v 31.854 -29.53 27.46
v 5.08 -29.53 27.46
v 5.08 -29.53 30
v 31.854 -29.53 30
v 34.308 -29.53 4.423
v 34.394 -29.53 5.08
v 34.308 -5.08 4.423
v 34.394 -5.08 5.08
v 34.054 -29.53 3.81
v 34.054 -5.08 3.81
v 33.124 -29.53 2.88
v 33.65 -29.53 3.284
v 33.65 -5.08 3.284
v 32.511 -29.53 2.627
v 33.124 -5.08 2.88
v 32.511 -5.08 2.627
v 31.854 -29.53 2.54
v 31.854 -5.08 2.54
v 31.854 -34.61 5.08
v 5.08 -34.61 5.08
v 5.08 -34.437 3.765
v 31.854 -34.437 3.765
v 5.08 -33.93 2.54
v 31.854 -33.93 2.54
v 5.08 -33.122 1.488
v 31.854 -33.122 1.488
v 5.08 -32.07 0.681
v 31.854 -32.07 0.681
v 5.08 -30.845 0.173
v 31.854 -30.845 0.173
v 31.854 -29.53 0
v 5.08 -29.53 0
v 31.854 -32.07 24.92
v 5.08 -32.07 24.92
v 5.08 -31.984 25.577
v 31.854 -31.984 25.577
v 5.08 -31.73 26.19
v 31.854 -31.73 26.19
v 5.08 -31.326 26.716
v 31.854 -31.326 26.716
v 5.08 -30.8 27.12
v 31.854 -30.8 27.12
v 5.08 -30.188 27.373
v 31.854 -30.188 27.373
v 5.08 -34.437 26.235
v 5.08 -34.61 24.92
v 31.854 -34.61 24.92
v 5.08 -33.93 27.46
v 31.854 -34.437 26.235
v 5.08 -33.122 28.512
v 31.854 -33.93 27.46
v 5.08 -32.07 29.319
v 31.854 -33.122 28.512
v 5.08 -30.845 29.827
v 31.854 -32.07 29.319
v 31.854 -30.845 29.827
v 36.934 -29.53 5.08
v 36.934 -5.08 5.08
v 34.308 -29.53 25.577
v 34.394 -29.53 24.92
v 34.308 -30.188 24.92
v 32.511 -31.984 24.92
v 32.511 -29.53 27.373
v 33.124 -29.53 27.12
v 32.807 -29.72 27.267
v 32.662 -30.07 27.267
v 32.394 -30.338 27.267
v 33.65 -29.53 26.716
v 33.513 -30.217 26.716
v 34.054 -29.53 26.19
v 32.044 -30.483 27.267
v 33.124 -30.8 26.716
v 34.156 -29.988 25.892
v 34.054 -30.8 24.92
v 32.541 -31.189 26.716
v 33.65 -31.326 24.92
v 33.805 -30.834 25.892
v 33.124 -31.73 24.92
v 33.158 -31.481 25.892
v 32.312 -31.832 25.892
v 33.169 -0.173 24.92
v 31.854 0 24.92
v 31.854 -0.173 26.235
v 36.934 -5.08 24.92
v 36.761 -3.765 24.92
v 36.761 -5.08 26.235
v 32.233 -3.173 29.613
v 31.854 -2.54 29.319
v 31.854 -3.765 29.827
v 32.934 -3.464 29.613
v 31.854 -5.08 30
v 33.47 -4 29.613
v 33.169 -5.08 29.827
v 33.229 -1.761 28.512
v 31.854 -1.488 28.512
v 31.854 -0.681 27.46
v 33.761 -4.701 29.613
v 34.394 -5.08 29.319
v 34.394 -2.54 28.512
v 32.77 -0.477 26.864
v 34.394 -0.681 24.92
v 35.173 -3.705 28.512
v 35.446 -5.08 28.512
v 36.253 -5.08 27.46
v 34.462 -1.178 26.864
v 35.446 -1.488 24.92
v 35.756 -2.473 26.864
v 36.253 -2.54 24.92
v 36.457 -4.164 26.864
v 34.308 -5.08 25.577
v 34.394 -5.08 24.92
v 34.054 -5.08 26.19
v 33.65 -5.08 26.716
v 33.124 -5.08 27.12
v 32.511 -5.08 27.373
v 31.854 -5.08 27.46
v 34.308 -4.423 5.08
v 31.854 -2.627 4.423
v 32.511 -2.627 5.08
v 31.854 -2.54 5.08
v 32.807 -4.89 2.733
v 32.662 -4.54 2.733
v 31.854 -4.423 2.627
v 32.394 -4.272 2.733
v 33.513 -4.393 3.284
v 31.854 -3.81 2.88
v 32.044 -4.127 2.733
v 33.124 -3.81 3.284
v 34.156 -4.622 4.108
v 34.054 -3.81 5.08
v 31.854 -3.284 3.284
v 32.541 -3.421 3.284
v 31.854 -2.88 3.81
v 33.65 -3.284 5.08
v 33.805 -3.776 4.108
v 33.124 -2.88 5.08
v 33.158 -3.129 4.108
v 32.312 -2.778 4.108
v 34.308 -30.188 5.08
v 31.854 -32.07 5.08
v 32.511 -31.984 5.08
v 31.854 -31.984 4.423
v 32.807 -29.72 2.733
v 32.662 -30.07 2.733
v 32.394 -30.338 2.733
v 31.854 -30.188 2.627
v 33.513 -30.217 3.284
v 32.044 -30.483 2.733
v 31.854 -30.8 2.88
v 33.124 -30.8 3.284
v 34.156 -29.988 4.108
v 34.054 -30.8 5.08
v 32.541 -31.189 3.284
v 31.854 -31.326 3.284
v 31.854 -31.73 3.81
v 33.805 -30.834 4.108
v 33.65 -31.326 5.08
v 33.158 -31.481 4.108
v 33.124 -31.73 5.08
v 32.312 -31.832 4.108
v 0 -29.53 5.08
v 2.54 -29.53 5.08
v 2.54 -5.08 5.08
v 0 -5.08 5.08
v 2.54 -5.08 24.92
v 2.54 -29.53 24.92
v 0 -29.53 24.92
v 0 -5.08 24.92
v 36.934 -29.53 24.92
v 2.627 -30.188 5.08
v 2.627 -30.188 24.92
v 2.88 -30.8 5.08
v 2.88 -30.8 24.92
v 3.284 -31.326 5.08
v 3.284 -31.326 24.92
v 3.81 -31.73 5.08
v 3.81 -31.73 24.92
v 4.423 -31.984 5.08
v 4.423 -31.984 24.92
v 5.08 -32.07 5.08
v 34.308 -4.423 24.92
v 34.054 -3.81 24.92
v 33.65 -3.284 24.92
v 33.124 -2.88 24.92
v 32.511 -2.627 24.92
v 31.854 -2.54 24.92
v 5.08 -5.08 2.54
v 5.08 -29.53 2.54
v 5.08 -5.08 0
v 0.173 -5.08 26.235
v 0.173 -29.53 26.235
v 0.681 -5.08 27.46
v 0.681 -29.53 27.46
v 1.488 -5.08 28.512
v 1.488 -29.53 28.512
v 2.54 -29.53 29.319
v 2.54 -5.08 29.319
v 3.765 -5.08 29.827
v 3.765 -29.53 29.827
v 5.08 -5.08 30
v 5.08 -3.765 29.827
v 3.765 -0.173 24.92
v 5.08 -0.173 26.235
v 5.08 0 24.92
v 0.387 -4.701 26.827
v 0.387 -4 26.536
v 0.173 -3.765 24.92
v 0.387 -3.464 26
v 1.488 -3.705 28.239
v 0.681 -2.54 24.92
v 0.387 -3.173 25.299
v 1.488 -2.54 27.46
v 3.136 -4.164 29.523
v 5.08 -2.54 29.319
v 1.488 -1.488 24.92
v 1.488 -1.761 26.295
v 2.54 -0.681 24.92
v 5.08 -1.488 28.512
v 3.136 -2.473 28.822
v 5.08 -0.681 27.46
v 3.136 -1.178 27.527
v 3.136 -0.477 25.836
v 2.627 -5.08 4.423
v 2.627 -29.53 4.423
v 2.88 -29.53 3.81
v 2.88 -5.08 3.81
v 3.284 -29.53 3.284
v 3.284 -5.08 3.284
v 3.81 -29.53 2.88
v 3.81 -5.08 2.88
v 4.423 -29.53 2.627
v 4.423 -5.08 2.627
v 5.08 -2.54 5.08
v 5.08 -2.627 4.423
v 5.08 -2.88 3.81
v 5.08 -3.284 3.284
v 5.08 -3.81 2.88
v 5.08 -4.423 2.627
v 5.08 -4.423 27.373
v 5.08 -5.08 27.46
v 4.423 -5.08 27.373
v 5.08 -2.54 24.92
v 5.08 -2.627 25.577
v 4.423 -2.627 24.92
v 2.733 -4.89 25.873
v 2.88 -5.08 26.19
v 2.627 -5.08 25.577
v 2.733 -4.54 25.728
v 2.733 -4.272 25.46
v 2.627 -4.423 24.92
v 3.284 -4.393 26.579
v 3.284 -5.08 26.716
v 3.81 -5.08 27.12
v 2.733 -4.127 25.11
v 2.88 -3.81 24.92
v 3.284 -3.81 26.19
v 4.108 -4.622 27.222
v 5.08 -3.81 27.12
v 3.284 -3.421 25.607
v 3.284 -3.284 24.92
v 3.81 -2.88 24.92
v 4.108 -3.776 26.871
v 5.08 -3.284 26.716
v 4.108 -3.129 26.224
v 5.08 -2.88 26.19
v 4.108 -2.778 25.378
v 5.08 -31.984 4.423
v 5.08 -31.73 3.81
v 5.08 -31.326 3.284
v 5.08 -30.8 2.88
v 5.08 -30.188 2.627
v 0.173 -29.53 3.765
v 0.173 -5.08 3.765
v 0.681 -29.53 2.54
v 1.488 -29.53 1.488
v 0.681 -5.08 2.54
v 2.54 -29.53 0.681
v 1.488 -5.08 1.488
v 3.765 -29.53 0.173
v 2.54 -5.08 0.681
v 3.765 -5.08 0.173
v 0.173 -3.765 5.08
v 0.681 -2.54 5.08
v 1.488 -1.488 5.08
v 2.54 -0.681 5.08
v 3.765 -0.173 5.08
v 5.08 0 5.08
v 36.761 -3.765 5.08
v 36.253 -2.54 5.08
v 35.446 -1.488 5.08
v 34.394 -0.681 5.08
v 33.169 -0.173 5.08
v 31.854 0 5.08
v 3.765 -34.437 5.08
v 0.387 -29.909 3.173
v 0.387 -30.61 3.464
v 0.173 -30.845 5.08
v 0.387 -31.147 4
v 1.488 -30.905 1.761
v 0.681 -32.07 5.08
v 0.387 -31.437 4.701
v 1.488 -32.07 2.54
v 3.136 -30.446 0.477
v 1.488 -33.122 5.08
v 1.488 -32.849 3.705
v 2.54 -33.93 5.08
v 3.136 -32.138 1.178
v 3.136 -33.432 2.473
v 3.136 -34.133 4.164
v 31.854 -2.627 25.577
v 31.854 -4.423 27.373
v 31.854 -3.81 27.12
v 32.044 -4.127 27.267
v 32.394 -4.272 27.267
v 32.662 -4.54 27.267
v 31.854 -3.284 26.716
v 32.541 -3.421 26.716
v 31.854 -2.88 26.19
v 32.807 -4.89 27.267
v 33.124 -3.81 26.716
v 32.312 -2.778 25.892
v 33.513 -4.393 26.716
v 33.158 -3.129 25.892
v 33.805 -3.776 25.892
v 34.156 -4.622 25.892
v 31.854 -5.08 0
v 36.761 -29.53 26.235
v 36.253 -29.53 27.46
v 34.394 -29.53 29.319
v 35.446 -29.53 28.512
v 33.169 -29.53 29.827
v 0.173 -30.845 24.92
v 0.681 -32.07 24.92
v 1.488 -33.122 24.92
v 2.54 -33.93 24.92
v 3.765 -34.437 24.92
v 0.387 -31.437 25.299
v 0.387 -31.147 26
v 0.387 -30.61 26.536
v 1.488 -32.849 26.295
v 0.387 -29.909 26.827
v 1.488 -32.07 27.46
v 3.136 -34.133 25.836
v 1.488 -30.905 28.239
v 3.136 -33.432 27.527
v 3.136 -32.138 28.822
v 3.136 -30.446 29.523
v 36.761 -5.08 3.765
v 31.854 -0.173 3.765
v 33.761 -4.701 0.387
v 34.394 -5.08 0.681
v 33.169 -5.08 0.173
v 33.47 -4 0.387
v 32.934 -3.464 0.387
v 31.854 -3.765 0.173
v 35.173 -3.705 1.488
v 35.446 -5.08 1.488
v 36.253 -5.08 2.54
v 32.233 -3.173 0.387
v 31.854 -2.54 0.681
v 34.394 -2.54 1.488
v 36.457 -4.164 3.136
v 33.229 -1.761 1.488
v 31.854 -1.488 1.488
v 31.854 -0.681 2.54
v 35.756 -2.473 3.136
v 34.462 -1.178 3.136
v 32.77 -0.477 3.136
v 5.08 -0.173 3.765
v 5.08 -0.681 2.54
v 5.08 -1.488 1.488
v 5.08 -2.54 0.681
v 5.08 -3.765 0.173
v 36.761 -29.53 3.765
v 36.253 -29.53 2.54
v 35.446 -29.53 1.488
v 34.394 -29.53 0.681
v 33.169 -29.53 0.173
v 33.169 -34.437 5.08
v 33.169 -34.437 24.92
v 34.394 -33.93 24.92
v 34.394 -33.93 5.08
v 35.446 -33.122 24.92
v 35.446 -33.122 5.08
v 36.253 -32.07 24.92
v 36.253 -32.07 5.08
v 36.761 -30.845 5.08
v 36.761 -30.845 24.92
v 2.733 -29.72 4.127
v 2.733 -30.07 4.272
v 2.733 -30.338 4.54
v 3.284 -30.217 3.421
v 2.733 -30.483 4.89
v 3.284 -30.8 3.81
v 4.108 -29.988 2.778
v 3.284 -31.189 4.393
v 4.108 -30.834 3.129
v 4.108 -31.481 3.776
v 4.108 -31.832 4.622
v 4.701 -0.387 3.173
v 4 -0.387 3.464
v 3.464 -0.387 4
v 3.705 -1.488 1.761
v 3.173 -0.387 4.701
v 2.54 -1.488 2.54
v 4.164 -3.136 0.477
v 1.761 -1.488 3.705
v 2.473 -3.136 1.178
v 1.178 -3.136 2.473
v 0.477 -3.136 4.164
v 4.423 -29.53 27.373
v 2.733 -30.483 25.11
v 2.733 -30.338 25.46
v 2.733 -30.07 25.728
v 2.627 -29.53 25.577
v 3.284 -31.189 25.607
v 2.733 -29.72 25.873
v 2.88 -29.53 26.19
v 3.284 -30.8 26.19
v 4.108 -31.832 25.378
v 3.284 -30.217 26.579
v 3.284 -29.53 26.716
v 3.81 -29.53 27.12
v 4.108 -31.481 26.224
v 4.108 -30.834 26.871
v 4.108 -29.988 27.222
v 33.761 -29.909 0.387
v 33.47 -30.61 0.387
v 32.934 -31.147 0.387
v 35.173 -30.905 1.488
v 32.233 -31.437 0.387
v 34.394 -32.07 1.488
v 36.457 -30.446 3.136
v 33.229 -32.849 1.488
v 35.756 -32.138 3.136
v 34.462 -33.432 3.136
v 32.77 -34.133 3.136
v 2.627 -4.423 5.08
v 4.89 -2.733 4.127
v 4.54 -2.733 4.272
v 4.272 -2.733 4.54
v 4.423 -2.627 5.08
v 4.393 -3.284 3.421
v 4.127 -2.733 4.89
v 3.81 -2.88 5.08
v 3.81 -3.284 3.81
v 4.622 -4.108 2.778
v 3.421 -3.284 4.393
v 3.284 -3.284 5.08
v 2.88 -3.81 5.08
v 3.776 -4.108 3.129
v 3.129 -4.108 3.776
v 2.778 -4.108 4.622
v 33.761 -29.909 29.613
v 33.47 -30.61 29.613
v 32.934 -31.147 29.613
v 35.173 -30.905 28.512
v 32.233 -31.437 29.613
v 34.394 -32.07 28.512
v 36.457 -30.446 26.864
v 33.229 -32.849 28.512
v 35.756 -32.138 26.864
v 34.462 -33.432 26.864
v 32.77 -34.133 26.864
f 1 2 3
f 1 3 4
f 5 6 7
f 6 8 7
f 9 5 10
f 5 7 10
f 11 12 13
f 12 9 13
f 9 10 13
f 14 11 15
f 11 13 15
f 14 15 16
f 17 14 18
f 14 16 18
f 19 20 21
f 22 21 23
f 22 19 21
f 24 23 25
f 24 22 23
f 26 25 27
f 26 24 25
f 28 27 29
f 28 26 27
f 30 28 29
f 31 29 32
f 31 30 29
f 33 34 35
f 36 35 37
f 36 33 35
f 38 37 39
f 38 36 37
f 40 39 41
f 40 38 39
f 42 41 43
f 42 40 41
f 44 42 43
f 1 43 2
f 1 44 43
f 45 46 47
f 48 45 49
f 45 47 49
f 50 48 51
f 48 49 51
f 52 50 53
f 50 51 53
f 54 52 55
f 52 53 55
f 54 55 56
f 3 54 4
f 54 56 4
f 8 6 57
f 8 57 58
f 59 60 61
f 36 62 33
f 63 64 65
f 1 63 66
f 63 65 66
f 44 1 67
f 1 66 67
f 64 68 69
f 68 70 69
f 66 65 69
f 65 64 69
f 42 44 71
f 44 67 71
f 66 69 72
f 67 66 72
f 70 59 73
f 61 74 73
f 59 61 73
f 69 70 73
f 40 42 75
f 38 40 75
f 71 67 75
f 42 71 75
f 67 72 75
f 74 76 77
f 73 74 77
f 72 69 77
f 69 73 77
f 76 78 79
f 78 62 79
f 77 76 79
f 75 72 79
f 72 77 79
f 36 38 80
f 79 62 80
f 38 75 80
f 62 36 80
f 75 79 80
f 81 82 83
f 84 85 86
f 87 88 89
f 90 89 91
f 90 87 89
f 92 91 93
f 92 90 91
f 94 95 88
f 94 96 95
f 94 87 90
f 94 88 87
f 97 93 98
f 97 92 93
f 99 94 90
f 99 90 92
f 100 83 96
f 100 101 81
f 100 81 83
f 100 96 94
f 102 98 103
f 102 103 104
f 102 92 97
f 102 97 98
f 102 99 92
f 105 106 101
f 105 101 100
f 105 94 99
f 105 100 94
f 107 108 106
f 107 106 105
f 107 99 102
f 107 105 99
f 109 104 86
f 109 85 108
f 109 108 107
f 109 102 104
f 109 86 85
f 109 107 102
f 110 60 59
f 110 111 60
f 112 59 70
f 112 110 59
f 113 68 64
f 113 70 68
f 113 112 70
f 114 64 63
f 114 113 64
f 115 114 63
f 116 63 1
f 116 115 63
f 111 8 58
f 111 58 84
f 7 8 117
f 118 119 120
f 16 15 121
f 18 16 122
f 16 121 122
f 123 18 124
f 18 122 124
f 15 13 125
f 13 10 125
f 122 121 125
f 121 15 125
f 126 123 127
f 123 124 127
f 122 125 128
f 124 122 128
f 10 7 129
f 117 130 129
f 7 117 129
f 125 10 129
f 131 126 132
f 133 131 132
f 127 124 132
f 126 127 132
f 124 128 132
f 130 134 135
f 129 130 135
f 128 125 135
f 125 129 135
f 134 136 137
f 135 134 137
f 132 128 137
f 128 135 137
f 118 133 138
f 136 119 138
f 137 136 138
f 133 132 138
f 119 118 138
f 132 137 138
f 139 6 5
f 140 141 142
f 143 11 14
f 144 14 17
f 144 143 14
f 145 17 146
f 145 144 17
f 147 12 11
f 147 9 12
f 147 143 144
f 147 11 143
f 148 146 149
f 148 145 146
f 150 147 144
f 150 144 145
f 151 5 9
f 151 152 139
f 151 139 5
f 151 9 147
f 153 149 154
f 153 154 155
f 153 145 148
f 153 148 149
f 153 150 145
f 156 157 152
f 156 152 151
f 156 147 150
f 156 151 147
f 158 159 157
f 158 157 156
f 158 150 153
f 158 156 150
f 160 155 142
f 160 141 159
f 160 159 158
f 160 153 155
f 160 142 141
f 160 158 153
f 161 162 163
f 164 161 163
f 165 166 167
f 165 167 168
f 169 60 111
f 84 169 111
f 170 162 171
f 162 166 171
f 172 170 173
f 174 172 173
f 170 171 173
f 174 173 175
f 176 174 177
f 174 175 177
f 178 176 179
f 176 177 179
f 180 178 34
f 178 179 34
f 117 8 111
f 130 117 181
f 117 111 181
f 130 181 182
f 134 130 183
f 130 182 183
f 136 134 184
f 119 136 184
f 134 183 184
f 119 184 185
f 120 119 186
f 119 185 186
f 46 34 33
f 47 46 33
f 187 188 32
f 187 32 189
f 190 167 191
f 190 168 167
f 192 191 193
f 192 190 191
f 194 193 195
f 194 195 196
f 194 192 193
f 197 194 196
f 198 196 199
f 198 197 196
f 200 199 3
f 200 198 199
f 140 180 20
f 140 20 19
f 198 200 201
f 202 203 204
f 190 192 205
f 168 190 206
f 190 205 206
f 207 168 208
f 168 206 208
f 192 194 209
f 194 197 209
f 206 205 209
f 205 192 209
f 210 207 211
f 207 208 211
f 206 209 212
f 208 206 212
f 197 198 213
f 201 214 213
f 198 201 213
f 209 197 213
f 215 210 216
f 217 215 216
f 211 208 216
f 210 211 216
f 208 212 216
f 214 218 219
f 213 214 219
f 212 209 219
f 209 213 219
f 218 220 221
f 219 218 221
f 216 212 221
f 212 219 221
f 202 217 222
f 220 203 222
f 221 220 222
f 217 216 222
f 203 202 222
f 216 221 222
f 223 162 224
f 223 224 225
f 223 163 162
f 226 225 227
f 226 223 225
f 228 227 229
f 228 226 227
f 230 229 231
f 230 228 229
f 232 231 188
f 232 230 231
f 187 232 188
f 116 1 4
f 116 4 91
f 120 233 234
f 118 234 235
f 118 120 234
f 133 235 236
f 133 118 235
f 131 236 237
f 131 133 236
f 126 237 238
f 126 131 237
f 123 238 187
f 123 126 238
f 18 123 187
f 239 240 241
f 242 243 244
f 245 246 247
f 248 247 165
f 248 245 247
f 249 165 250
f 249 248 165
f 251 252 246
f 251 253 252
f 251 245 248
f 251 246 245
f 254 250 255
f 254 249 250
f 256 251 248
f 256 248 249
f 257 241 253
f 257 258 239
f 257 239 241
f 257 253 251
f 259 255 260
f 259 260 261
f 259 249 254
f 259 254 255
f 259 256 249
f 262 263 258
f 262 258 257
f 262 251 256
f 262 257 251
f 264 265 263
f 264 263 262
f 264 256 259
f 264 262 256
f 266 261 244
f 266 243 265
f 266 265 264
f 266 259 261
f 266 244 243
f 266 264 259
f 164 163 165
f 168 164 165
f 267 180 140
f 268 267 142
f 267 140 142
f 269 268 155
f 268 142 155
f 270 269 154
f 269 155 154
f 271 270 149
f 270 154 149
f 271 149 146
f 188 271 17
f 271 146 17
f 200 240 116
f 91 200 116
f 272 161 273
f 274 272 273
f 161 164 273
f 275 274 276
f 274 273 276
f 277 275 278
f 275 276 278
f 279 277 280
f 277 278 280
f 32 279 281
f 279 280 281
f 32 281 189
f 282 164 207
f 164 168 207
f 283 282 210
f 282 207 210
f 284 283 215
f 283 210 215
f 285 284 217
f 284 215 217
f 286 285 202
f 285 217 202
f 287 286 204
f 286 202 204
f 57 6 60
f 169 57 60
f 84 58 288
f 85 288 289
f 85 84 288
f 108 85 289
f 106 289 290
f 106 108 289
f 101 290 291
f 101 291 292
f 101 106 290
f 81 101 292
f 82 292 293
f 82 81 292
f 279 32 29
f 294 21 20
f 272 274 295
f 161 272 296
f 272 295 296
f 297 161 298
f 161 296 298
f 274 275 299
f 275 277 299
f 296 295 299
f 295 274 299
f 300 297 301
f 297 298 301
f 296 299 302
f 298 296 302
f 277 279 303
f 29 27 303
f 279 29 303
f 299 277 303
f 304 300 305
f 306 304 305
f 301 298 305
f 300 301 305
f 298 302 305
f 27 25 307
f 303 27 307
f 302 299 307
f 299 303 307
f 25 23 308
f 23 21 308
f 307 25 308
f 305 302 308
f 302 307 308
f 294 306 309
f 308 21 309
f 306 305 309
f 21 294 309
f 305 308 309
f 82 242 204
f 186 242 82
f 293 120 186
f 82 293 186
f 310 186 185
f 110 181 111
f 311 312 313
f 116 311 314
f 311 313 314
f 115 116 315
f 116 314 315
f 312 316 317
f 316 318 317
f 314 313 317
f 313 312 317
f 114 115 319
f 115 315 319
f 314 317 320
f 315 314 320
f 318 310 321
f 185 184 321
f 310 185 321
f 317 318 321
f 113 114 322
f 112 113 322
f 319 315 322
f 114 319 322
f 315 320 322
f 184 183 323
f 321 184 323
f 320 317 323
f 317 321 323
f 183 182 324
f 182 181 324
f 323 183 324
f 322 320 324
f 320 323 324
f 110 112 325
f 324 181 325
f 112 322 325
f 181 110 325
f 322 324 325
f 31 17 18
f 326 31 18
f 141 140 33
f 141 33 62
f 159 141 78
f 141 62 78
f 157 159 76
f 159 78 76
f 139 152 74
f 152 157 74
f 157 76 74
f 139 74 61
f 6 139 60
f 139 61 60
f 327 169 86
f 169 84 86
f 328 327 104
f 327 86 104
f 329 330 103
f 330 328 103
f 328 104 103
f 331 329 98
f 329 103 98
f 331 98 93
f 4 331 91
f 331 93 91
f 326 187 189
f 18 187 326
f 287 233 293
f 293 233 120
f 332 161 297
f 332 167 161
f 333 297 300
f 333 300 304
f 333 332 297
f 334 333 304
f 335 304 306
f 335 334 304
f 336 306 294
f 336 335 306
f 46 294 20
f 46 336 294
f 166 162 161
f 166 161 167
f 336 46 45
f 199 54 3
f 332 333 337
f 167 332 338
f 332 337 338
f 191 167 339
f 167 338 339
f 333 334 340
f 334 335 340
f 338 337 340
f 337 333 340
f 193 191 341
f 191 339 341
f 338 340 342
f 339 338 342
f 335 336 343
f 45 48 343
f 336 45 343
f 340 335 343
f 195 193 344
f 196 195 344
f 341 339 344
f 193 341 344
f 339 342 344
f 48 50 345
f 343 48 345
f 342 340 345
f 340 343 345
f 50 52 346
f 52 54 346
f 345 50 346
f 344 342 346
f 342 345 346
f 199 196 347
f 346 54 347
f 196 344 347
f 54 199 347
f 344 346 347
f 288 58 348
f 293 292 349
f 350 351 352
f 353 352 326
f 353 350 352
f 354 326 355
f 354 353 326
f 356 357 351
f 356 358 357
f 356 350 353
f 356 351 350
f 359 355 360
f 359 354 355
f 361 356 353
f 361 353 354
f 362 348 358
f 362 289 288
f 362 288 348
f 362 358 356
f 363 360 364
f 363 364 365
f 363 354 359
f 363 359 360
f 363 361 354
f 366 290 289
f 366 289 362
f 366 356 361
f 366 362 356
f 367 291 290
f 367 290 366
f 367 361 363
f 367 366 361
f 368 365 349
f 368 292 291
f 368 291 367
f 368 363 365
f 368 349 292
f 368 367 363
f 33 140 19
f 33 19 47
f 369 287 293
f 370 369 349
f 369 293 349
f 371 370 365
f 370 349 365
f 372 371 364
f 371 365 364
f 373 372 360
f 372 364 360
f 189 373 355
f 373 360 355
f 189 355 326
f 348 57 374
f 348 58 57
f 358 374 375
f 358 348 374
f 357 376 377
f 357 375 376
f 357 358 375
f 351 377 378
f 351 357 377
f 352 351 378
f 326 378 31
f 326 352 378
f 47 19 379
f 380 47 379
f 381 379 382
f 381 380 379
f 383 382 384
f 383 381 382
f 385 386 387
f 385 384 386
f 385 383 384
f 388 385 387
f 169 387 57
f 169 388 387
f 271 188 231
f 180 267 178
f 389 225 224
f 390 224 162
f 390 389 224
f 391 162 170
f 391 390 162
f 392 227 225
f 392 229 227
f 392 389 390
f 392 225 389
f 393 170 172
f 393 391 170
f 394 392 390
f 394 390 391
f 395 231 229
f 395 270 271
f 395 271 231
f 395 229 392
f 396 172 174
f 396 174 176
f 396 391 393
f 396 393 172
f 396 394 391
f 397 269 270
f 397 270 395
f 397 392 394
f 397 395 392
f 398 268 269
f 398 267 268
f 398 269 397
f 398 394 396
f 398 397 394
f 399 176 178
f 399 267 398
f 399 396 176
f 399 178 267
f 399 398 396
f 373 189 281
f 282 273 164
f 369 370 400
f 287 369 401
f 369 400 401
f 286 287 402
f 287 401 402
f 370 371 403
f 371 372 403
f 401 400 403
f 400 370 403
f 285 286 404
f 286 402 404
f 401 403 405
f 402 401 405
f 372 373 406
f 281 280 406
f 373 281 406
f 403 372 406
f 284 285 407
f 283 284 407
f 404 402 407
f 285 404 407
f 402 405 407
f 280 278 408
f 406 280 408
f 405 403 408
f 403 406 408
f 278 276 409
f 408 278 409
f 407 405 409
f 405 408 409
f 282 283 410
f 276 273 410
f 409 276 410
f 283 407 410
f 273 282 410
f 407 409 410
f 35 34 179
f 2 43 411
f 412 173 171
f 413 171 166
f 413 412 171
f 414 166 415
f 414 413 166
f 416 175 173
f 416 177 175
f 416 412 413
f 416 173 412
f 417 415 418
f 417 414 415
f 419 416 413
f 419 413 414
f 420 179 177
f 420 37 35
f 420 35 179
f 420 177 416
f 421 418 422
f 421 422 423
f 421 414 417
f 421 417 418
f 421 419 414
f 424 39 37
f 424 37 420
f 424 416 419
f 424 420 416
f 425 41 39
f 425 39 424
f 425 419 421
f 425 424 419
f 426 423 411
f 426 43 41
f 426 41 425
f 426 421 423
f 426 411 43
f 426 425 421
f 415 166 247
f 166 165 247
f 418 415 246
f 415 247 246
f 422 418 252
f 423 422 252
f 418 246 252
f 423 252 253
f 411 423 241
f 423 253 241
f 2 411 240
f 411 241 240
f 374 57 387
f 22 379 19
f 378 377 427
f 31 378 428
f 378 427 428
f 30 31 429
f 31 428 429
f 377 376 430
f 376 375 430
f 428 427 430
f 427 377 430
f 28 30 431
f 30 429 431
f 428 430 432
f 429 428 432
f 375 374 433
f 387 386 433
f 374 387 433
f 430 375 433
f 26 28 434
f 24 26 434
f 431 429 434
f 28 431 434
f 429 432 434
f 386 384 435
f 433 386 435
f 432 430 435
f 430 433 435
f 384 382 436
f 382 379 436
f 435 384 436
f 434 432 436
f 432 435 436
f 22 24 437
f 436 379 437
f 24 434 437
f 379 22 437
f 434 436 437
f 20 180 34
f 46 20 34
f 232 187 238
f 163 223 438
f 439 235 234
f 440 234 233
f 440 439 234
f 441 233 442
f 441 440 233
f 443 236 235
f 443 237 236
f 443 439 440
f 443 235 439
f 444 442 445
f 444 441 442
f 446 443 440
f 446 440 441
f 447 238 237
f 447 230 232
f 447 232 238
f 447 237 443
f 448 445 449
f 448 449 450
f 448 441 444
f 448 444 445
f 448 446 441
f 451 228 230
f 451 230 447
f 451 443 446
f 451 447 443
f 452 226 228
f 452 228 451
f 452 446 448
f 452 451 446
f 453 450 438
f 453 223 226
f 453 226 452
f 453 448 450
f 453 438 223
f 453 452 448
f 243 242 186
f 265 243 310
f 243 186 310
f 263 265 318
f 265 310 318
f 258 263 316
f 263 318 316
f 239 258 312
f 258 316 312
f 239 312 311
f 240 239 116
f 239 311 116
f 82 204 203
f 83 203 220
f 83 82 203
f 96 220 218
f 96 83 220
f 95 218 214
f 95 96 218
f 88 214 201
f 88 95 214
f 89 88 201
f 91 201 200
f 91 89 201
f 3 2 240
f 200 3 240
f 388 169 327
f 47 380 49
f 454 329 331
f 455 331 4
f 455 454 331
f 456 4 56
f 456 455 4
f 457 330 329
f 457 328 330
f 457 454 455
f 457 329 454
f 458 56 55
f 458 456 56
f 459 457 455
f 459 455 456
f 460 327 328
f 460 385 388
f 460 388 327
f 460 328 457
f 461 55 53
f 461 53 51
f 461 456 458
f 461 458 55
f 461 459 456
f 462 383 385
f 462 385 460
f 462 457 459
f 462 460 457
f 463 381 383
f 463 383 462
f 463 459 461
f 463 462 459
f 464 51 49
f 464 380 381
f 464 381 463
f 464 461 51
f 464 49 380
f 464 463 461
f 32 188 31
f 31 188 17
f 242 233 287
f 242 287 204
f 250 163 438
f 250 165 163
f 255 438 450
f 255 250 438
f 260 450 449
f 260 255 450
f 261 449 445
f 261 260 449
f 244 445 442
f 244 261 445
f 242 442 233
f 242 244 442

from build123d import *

# Parameters (mm, degrees)
F0_W     = 36.9340777397
F0_H     = 34.6101336181
F1_DEPTH = 30
F2_R     = 5.08
F3_T     = -2.54


# Not quite as in the source:
# - a shell that OpenCascade refuses in one call is made with other operations: the cavity is built on its own and cut out


with BuildPart() as f1:
    # F0 (on Top) → F1 (new body)
    with BuildSketch(Plane.XY):
        with Locations((18.4670388699, -17.3050668091)):
            Rectangle(F0_W, F0_H)
    extrude(amount=F1_DEPTH)

    # F2
    f2_edges = [f1.edges().sort_by_distance(p)[0] for p in [
        (36.934078, -34.610134, 15),
        (36.934078, 0, 15),
        (36.934078, -17.305067, 0),
        (18.467039, -34.610134, 0),
        (0, -17.305067, 0),
        (18.467039, 0, 0),
        (18.467039, 0, 30),
        (36.934078, -17.305067, 30),
        (18.467039, -34.610134, 30),
        (0, -34.610134, 15),
        (0, -17.305067, 30),
        (0, 0, 15),
    ]]
    fillet(f2_edges, radius=F2_R)

    # F3: a shell. OpenCascade refuses it in one call, so the cavity is built on its own and cut out:
    # the body offset inwards by the wall thickness, plus a prism from it out through each open face.
    f3_core = offset(f1.part, amount=F3_T, mode=Mode.PRIVATE)
    f3_exits = [f3_core.faces().sort_by_distance(p)[0] for p in [
        (18.467039, -17.305067, 27.46),
        (18.467039, -32.070134, 15),
        (18.467039, -2.54, 15),
        (2.54, -17.305067, 15),
        (18.467039, -17.305067, 2.54),
        (34.394078, -17.305067, 15),
    ]]
    add(f3_core, mode=Mode.SUBTRACT)
    extrude(f3_exits, amount=-F3_T, mode=Mode.SUBTRACT)


solid = f1.part
